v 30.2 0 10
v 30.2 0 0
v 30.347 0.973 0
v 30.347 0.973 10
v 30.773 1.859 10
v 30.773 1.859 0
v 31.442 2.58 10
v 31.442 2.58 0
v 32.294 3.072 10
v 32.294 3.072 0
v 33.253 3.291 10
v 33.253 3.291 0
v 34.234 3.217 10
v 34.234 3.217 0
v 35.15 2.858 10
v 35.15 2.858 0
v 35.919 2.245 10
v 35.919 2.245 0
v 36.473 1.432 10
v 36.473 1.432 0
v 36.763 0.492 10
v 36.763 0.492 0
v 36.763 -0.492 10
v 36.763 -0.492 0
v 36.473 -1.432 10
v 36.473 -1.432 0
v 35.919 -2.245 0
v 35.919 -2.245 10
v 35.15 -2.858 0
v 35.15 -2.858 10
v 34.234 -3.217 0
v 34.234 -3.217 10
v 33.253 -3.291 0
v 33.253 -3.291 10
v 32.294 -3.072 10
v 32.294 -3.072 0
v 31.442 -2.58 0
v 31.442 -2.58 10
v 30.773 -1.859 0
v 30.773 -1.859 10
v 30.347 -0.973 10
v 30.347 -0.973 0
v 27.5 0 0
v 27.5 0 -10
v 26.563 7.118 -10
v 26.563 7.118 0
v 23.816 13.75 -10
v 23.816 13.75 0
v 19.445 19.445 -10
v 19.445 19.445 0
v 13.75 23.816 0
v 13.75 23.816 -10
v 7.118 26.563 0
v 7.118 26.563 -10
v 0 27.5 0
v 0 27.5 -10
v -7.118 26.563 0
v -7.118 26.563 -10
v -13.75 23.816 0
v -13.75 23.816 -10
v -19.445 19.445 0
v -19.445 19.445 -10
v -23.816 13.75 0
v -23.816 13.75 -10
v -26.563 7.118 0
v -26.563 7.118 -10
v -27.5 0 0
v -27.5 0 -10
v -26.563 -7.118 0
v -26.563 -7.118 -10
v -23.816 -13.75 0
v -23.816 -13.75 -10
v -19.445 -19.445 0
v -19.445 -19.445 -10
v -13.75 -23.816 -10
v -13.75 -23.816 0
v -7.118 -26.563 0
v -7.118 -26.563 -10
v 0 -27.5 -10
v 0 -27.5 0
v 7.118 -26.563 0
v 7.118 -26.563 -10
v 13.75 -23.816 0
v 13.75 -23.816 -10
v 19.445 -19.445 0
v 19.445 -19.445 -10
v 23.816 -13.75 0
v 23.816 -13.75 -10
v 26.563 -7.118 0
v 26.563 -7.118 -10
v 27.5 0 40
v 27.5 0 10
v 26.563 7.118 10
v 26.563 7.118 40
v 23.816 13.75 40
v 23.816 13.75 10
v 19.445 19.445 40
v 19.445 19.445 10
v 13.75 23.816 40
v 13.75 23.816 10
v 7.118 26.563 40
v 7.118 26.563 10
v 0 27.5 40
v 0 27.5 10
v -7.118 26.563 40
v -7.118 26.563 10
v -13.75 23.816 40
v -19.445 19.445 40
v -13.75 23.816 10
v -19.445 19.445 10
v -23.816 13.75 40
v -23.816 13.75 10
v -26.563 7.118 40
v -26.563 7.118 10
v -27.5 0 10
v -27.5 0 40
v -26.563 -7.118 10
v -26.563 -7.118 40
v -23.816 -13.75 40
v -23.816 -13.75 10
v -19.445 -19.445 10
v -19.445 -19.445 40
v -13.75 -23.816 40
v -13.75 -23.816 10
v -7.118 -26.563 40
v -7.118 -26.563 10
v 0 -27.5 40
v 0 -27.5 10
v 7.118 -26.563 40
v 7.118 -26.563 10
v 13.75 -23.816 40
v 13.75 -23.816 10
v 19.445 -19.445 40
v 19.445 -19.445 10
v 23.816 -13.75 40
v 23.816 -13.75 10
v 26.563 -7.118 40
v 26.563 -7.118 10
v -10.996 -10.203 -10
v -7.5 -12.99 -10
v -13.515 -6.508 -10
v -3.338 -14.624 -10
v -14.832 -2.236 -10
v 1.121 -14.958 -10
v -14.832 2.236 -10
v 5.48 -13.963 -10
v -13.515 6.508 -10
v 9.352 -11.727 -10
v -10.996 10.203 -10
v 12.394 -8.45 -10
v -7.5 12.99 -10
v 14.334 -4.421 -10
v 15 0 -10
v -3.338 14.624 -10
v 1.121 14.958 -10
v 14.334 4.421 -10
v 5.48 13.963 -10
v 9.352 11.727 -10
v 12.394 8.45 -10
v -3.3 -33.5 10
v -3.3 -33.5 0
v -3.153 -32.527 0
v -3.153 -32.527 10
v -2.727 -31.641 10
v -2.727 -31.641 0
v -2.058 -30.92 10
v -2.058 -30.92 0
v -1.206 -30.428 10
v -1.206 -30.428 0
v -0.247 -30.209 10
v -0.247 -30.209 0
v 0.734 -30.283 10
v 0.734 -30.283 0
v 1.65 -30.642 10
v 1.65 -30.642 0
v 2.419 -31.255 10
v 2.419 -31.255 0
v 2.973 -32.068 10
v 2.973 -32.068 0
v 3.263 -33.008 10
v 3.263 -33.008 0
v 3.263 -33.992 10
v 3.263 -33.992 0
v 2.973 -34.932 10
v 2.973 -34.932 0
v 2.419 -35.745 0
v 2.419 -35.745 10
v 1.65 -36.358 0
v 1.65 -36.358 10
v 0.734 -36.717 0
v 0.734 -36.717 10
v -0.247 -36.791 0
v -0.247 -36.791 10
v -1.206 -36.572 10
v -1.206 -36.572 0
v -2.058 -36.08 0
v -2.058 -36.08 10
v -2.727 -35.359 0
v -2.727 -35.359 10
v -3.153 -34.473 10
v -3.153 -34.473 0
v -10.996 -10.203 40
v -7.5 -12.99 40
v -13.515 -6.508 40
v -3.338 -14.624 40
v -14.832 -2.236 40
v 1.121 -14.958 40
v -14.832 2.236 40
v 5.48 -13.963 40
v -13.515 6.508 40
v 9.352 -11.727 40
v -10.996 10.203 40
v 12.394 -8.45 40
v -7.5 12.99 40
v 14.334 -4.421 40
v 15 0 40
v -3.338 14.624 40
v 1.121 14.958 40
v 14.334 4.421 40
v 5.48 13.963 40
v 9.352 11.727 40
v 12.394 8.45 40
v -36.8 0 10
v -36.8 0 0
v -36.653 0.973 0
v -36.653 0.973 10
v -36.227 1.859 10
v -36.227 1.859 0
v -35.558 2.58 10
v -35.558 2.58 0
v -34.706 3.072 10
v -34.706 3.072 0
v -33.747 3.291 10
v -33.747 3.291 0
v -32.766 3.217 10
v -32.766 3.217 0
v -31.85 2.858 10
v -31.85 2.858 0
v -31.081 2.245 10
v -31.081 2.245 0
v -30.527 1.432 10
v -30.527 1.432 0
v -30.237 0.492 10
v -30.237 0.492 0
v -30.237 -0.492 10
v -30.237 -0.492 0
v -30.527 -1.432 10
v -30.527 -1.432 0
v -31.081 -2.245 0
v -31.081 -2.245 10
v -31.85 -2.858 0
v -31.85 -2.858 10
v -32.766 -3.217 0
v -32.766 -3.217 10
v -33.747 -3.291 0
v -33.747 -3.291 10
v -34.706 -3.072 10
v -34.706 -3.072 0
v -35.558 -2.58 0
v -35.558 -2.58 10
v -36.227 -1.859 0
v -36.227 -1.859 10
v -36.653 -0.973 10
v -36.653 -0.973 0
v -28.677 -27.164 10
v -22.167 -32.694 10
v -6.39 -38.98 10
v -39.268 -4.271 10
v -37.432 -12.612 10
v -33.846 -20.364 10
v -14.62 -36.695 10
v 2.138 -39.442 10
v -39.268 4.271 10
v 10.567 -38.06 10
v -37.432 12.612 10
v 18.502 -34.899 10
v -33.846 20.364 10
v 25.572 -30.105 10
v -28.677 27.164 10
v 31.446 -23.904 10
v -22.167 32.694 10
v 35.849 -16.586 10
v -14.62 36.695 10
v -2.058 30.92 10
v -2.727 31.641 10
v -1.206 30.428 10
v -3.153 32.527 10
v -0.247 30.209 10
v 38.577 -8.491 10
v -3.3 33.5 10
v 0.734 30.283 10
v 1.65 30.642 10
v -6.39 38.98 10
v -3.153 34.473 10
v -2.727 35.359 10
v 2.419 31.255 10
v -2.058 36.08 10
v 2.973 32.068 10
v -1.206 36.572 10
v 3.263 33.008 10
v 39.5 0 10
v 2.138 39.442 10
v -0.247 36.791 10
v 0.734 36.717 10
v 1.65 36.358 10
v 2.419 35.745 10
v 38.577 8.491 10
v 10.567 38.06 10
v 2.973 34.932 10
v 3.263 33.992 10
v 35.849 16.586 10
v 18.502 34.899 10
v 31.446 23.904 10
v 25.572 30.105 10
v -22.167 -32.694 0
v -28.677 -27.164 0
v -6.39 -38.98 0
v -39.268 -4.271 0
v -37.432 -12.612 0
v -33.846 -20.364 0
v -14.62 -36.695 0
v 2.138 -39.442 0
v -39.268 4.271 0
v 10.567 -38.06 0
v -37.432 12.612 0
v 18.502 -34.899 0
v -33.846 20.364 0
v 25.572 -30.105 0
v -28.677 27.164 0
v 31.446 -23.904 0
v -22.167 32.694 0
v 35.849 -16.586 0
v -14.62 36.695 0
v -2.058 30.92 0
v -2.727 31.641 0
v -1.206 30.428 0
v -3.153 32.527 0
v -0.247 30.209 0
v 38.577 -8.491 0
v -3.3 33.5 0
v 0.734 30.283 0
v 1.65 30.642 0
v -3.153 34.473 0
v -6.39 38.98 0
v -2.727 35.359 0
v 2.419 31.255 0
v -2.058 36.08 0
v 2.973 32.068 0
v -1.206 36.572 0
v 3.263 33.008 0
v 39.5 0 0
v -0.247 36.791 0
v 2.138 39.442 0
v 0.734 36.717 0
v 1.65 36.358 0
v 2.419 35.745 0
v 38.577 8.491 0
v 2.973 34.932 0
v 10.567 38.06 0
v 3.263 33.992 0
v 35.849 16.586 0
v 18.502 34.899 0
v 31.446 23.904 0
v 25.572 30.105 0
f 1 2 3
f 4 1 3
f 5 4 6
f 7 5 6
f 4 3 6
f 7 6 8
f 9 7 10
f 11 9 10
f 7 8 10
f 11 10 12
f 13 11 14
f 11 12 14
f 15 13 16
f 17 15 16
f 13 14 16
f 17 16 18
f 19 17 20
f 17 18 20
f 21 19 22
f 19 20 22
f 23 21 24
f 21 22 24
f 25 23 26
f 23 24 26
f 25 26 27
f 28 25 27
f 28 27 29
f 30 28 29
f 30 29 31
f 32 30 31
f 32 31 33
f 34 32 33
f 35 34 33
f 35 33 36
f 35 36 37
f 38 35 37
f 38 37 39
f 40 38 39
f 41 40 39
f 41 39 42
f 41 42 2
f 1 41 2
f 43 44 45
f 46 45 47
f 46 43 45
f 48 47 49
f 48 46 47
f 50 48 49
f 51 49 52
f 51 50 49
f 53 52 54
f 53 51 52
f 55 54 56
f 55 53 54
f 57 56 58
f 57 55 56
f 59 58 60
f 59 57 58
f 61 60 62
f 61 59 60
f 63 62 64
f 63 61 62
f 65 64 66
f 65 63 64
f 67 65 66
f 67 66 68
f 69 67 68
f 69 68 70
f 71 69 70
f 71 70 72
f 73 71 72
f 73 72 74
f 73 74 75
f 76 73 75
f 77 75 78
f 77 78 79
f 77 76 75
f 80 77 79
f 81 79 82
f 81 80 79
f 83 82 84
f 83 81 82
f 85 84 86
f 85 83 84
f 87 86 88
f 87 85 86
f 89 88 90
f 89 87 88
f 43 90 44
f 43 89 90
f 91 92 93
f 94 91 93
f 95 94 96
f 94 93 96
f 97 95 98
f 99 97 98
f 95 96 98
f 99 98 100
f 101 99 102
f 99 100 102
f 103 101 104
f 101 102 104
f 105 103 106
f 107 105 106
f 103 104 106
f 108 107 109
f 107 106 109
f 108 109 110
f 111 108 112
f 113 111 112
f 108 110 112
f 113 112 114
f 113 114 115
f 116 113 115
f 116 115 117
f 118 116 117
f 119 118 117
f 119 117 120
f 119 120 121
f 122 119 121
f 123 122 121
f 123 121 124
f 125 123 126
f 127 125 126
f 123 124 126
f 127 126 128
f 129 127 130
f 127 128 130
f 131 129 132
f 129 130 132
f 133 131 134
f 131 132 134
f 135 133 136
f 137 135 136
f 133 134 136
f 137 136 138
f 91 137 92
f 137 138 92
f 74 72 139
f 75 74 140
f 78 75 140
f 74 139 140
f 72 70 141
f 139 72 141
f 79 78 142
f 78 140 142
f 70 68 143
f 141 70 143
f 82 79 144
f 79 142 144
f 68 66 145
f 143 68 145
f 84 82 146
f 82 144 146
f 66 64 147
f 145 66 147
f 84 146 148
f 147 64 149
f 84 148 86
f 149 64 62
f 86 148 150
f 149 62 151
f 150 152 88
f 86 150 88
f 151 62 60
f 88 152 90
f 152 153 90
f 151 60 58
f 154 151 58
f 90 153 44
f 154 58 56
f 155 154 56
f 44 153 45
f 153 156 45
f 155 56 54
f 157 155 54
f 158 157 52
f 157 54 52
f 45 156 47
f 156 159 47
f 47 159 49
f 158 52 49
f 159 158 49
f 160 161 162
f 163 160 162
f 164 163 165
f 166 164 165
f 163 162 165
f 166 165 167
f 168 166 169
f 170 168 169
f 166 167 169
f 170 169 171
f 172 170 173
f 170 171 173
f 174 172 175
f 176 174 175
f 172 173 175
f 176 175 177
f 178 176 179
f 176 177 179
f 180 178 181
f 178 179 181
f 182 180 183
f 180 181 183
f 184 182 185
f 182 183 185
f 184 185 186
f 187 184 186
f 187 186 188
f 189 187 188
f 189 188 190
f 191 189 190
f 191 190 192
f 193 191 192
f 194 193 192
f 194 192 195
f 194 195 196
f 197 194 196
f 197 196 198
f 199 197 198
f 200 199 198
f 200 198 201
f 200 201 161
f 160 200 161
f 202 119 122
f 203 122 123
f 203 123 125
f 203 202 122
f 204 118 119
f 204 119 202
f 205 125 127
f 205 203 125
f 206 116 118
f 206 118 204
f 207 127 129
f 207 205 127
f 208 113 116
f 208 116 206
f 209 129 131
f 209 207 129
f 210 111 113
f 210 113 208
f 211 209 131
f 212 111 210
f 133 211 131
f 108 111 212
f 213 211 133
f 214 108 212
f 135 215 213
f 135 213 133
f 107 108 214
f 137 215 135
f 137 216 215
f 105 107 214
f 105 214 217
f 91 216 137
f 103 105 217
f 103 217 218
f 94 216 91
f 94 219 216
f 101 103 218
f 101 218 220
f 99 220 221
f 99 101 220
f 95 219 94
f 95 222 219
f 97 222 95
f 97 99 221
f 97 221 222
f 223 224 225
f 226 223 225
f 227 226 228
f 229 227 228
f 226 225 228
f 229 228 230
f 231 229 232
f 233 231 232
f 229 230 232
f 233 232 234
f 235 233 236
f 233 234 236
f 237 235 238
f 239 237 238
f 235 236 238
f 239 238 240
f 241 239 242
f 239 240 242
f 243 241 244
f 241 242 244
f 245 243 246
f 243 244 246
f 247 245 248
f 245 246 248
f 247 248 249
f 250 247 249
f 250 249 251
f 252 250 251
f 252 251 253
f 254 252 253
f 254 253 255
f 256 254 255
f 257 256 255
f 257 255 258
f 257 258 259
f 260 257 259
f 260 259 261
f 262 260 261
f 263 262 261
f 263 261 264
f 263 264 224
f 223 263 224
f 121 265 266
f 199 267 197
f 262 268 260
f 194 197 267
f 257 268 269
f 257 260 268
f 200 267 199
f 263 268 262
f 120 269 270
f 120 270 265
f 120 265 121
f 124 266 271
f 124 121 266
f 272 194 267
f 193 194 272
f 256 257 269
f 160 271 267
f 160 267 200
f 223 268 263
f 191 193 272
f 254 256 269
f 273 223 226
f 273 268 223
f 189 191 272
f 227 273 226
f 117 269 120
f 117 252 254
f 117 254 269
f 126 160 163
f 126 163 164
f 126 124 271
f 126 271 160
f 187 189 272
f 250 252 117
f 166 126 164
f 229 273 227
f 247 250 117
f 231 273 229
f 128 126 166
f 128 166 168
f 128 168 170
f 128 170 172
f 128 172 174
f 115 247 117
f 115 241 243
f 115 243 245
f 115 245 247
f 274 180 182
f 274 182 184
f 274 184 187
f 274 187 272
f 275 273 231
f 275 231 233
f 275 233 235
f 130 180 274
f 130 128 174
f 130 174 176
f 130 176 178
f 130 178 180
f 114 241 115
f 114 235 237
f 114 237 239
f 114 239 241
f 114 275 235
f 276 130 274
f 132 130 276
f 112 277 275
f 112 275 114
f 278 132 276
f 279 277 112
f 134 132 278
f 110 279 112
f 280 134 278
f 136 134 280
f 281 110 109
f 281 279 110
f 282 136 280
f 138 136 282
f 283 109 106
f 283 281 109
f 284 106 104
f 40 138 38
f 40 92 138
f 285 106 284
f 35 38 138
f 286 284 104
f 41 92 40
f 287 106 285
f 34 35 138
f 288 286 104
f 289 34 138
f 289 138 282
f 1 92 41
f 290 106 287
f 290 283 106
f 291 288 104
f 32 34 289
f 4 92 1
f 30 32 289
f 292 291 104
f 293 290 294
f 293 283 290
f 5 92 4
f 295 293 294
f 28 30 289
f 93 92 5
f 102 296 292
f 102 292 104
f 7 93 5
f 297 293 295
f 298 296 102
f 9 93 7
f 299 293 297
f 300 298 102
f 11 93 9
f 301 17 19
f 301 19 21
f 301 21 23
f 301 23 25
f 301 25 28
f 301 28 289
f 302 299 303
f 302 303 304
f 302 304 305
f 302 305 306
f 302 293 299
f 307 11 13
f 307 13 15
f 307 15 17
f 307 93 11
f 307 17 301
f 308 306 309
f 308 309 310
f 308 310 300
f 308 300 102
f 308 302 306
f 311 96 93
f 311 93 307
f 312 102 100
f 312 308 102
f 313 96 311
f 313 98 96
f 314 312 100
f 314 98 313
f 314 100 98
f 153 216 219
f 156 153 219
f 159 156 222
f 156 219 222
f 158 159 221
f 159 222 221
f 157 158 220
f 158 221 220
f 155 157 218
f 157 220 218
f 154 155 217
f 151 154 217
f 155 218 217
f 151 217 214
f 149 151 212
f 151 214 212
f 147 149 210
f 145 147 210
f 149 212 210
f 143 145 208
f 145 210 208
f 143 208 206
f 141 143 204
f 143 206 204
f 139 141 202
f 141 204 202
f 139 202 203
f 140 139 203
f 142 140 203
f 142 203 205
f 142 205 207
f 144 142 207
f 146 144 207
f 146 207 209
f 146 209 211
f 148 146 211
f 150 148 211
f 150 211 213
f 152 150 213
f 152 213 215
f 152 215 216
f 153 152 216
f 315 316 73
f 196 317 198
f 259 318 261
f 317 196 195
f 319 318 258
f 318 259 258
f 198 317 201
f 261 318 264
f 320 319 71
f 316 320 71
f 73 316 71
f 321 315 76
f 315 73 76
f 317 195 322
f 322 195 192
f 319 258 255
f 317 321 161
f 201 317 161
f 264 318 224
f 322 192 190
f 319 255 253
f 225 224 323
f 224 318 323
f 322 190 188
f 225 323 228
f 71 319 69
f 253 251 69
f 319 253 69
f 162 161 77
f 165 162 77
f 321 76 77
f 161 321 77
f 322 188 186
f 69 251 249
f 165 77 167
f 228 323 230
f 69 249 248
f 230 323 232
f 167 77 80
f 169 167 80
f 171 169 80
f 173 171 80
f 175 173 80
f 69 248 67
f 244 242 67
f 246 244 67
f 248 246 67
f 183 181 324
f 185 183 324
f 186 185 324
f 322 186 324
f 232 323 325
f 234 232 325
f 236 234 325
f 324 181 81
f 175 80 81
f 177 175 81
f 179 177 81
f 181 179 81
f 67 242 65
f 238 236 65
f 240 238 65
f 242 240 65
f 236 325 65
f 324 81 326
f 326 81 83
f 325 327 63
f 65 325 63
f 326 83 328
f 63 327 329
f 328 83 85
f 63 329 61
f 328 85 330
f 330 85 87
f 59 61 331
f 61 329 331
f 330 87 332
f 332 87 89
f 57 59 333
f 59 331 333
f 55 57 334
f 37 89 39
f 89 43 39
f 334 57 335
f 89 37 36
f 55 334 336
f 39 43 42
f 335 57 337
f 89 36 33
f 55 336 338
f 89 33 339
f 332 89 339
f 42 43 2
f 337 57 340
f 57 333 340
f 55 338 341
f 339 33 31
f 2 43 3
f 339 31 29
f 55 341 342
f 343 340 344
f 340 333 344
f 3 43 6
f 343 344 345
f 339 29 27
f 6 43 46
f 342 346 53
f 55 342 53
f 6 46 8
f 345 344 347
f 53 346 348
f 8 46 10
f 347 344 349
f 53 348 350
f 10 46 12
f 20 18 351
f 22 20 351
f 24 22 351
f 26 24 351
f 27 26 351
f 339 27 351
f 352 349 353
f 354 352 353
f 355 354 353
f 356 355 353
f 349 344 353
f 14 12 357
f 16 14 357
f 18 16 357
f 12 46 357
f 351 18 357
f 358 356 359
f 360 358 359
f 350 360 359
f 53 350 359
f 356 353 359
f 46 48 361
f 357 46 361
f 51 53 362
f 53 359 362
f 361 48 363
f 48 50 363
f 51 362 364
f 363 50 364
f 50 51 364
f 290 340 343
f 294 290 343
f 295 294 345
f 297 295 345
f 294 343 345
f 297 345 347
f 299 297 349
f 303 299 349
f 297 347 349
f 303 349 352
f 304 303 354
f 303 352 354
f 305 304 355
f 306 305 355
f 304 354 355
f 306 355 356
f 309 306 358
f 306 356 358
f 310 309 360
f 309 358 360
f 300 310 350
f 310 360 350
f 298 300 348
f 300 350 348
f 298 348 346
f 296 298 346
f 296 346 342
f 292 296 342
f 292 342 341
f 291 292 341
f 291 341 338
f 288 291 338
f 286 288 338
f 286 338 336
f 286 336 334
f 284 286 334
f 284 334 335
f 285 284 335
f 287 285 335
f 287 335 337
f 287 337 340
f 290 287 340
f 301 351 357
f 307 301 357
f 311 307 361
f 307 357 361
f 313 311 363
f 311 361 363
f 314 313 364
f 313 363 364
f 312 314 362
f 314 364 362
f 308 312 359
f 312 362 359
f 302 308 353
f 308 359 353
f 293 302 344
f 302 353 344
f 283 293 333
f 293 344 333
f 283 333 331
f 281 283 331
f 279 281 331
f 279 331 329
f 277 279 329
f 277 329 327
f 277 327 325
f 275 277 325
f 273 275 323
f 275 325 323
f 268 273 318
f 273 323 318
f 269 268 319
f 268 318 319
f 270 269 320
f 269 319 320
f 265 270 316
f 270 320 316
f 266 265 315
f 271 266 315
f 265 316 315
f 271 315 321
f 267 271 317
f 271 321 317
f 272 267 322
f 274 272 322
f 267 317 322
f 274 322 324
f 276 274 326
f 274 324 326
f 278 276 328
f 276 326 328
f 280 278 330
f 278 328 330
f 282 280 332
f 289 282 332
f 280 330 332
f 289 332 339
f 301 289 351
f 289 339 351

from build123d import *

# Parameters (mm, degrees)
F0_R     = 27.5
F1_DEPTH = 10
F2_R     = 39.5
F3_DEPTH = 10
F4_R     = 27.5
F5_DEPTH = 30
F6_R     = 15
F7_DEPTH = 50.001
F9_D     = 6.6


with BuildPart() as f1:
    # F0 (on Top) → F1 (new body)
    with BuildSketch(Plane.XY):
        Circle(F0_R)
    extrude(amount=-F1_DEPTH)

    # F2 (on Top) → F3 (join)
    with BuildSketch(Plane.XY):
        Circle(F2_R)
    extrude(amount=F3_DEPTH)

    # F4 (on face) → F5 (join)
    with BuildSketch(Plane.XY.offset(10)):
        Circle(F4_R)
    extrude(amount=F5_DEPTH)

    # F6 (on face) → F7 (cut, through all)
    with BuildSketch(Plane.XY.offset(40)):
        Circle(F6_R)
    extrude(amount=-F7_DEPTH, mode=Mode.SUBTRACT)

    # F9 (through all)
    with Locations(Plane.XY.offset(10)):
        with Locations((0, 33.5), (33.5, 0), (0, -33.5), (-33.5, 0)):
            Hole(F9_D / 2)


solid = f1.part
